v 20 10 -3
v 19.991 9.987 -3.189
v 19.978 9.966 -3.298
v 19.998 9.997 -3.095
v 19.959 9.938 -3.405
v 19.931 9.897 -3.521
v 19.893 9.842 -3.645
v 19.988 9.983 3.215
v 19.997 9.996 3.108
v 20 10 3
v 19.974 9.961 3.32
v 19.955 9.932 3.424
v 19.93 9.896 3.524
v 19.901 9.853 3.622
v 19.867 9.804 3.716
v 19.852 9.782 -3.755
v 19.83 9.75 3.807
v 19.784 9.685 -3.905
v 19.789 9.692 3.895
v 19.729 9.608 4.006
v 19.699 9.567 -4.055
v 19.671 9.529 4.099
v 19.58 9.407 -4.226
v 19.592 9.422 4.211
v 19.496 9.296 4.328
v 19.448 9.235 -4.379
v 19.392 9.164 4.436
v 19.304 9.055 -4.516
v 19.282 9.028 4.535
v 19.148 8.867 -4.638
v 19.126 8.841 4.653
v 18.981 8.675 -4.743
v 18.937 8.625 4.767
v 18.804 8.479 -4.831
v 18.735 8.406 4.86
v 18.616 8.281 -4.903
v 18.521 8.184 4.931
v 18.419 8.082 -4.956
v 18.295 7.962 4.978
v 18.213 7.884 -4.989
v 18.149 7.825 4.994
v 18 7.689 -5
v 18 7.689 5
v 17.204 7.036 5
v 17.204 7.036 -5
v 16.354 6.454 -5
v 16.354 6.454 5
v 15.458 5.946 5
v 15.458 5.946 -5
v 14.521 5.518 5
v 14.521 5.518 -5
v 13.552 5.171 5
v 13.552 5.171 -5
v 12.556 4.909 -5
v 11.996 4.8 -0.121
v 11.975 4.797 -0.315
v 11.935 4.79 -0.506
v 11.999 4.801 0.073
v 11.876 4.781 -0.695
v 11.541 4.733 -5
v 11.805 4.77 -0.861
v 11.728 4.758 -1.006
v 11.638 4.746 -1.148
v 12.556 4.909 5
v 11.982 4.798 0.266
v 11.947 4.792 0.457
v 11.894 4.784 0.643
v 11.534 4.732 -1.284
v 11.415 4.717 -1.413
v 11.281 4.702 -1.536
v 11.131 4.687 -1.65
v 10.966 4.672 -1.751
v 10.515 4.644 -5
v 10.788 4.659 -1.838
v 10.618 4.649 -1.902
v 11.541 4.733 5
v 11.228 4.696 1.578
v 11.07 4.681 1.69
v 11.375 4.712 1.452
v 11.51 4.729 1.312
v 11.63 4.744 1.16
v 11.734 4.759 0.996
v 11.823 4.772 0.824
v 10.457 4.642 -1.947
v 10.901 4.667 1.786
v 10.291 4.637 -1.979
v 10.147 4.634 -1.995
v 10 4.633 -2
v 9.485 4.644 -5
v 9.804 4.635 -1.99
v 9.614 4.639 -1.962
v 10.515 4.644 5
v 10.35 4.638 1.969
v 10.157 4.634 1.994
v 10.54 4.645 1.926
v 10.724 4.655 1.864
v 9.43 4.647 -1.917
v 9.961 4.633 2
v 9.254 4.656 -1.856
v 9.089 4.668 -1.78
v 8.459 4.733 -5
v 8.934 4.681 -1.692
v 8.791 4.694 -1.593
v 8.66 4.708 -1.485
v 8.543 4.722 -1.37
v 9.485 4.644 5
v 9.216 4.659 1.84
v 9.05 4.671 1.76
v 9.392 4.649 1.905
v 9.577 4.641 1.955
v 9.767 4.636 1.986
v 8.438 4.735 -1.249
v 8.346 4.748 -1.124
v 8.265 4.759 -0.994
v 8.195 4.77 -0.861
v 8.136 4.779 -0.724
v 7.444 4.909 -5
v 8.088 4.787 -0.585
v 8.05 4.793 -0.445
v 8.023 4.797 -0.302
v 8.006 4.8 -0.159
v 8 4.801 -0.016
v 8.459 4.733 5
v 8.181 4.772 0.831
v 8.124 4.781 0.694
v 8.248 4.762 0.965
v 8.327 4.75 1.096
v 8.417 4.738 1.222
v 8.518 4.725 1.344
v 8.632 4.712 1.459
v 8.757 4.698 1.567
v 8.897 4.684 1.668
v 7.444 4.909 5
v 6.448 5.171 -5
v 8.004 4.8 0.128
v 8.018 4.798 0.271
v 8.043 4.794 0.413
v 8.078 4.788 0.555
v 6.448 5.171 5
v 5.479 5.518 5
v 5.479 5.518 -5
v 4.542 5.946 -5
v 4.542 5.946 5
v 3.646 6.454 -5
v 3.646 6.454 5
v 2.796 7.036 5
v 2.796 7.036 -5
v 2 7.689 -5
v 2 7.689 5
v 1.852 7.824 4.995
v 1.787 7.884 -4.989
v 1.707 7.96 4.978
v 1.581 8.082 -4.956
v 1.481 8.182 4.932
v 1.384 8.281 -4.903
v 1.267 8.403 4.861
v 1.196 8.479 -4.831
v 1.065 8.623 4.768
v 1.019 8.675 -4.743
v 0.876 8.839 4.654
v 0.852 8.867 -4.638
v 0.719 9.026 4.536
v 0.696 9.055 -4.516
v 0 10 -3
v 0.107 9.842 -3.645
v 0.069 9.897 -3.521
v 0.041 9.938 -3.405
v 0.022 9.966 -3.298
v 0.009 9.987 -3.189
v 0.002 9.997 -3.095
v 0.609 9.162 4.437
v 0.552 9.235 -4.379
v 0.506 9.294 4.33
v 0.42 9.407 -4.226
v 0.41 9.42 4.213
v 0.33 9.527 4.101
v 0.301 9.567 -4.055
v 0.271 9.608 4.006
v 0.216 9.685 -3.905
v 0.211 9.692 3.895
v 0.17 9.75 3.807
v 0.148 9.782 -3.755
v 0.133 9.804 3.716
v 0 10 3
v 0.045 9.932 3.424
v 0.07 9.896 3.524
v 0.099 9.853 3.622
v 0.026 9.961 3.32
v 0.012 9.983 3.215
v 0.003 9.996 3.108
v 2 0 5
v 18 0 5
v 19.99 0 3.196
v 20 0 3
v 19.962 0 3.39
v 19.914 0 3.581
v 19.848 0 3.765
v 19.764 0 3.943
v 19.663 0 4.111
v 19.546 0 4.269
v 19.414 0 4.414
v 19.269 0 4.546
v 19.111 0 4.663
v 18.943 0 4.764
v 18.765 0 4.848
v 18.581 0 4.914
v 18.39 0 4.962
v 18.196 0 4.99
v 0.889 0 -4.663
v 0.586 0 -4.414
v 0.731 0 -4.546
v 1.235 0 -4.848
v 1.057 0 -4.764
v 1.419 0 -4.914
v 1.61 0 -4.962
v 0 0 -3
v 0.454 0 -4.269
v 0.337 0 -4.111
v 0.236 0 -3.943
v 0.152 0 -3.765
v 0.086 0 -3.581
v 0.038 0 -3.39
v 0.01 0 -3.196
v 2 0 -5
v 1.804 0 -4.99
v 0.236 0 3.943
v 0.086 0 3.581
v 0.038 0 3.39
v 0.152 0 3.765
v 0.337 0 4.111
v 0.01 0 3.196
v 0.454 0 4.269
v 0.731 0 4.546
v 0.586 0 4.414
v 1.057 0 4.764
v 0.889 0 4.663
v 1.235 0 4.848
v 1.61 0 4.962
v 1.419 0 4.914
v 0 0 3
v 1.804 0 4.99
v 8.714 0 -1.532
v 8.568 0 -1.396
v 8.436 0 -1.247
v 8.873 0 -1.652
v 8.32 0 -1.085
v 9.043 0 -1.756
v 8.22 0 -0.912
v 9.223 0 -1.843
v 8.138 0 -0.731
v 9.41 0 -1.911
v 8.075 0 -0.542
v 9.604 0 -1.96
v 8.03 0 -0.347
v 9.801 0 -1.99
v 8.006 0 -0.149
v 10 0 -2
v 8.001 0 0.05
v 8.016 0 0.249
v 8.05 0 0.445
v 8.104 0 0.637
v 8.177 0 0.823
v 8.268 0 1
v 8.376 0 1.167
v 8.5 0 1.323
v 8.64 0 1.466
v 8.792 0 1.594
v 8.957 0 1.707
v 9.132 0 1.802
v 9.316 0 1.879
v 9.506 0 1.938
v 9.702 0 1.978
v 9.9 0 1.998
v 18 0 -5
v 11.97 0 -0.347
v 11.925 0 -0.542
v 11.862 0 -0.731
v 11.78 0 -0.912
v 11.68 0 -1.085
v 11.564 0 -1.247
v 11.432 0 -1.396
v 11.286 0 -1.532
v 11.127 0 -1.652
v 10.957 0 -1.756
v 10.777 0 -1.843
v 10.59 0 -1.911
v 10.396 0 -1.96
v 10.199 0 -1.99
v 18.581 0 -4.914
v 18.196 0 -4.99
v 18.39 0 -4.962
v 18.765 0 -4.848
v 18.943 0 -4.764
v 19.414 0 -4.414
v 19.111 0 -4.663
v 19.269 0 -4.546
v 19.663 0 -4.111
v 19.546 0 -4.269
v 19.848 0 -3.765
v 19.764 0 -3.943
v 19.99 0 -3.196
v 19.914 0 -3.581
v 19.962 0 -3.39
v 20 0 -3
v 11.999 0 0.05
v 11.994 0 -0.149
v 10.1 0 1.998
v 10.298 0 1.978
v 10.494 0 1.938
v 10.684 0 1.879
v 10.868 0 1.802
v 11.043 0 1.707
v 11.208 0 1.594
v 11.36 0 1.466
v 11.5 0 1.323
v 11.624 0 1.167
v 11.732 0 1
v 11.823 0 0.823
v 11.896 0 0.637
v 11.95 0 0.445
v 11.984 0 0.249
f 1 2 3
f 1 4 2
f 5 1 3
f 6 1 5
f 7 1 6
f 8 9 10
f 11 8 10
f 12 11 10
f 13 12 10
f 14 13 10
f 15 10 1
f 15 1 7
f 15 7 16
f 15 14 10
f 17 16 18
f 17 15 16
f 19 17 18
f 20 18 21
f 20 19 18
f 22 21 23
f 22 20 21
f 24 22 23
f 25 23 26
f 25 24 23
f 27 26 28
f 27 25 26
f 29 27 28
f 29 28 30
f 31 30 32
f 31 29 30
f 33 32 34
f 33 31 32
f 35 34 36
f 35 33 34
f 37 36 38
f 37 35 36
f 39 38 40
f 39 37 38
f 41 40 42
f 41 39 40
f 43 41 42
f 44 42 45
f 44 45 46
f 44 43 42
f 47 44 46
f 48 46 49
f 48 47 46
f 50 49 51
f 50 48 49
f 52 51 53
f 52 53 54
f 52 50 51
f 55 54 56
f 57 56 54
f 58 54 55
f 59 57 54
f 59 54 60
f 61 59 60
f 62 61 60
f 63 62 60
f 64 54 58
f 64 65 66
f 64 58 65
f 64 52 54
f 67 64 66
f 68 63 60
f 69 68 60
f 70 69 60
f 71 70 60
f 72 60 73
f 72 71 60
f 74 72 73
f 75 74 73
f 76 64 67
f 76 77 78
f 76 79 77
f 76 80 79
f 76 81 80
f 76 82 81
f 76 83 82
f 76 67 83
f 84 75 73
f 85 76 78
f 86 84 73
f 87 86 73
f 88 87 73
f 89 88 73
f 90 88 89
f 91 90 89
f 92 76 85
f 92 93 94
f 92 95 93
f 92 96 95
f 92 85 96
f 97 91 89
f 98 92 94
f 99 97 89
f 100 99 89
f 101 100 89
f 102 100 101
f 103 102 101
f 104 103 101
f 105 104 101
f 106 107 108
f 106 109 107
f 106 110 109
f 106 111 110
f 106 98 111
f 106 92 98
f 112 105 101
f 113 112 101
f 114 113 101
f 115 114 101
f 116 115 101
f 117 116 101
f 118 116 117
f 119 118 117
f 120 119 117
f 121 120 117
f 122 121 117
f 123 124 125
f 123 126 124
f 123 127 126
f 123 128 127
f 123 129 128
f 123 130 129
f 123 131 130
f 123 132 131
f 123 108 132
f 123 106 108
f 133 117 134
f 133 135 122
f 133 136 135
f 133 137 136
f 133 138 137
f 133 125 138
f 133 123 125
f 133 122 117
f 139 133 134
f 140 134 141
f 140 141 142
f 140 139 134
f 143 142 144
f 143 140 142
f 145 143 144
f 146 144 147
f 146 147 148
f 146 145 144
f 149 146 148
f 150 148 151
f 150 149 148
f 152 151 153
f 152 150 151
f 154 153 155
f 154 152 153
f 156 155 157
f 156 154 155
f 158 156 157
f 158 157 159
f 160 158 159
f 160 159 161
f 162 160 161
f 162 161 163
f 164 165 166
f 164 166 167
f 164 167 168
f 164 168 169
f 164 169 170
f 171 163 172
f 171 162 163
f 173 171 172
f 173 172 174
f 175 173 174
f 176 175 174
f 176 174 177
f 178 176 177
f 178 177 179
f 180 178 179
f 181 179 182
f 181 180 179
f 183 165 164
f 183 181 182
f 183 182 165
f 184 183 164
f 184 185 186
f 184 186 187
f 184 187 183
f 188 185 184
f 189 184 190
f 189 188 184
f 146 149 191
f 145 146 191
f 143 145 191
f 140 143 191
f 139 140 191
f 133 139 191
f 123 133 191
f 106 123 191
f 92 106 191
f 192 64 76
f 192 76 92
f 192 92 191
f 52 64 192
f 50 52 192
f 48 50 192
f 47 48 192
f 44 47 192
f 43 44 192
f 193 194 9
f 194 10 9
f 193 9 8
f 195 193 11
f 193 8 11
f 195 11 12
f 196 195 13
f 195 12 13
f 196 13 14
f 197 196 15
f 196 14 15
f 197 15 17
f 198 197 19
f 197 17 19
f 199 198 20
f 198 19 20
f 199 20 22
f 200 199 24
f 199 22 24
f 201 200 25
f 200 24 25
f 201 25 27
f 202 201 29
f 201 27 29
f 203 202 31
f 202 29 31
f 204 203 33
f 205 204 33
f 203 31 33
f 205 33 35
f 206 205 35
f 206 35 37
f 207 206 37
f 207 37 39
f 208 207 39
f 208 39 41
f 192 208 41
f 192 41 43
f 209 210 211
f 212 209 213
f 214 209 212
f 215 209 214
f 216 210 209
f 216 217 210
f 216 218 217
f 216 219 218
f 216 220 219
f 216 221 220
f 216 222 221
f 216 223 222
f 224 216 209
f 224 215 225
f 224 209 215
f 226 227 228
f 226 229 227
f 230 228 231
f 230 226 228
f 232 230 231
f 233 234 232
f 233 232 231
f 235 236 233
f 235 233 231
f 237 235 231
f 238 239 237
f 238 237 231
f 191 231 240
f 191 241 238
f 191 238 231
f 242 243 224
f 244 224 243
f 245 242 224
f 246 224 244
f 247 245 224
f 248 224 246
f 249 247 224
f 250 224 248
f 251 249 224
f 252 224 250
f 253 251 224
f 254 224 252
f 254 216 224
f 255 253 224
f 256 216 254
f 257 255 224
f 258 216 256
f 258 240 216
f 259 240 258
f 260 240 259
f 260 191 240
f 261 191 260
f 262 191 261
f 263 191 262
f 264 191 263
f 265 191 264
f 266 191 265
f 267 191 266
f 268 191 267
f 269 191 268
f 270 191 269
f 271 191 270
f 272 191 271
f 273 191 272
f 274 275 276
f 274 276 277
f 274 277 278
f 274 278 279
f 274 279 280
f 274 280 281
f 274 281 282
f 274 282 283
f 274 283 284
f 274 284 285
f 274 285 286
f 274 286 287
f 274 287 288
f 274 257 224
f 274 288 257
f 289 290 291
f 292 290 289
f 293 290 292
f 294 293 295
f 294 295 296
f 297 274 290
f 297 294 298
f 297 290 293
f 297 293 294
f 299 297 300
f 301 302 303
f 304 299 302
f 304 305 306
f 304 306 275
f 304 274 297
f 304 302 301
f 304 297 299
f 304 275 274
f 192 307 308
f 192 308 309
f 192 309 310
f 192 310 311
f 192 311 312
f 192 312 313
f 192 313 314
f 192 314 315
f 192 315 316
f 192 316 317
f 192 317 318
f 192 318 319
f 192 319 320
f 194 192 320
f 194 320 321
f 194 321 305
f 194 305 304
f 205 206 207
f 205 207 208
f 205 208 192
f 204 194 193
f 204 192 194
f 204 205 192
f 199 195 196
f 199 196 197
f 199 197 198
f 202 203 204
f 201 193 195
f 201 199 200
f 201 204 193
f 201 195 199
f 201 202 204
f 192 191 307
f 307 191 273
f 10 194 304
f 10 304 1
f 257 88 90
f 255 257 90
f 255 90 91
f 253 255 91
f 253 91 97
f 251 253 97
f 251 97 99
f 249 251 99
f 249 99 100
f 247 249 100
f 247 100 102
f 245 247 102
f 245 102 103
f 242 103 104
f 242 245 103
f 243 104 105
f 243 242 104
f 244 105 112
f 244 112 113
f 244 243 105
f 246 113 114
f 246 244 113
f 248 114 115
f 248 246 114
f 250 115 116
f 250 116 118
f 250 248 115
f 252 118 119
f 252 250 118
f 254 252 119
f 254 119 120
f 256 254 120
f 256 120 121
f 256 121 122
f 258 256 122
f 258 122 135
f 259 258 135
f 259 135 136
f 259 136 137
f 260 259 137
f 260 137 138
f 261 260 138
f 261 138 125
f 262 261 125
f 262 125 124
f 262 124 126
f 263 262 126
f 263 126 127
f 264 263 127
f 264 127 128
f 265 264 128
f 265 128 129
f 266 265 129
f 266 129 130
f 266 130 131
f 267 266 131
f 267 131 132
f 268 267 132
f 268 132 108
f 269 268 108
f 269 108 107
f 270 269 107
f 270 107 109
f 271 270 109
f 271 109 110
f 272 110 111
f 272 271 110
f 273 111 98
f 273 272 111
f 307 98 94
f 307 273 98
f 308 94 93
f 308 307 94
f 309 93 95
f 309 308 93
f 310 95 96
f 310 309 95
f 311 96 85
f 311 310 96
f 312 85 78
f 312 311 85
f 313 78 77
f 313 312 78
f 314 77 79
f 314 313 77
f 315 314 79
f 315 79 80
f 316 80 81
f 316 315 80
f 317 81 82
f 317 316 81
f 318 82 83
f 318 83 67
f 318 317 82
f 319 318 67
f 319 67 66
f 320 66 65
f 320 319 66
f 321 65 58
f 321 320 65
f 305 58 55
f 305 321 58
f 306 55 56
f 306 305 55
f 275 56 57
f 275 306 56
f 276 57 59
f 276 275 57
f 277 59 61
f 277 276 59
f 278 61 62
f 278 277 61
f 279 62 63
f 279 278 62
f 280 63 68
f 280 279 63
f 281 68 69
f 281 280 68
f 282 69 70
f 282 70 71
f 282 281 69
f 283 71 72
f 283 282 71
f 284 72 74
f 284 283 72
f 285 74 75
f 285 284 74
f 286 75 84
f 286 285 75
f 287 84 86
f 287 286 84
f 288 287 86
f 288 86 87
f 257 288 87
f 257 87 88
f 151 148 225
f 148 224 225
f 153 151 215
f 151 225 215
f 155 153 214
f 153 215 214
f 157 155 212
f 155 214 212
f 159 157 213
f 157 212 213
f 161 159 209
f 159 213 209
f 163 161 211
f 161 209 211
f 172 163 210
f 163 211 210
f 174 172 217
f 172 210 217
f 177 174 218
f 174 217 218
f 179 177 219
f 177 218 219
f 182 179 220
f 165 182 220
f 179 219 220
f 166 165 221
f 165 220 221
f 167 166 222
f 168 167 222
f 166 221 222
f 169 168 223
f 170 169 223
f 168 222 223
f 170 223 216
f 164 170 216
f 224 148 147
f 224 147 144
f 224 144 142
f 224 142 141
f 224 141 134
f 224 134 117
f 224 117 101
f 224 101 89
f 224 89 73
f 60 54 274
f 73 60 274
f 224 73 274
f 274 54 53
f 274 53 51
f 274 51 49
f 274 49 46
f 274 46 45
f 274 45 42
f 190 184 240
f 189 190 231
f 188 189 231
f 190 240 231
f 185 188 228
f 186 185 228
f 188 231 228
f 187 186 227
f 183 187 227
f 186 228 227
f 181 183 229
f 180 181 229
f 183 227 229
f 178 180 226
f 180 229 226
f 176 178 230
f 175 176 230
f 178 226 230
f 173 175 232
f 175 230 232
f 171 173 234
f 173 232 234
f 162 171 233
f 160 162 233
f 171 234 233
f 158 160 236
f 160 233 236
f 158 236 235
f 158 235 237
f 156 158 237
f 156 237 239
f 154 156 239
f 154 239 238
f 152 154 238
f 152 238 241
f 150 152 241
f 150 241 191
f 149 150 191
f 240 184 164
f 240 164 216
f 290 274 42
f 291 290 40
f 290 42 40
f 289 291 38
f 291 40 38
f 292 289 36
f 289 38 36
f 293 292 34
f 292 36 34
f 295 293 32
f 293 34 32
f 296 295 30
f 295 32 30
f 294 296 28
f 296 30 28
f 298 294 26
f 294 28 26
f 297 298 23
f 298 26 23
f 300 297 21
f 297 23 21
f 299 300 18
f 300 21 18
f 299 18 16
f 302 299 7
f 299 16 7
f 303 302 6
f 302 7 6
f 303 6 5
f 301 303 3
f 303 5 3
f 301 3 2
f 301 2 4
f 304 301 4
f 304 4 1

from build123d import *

# Parameters (mm, degrees)
EXTRUDE_1_DEPTH     = 5
SKETCH_2_R          = 2
CUT_EXTRUDE_1_DEPTH = 15
FILLET_1_R          = 2


with BuildPart() as part:
    # 草图1 → 凸台-拉伸1 (new, symmetric)
    with BuildSketch(Plane.XY):
        with BuildLine():
            Line((0, 0), (20, 0))
            Line((20, 0), (20, 10))
            ThreePointArc((20, 10), (10, 4.633249581), (0, 10))
            Line((0, 10), (0, 0))
        make_face()
    extrude(amount=EXTRUDE_1_DEPTH, both=True)

    # 草图2 → 切除-拉伸1 (cut)
    with BuildSketch(Plane(origin=(0, 0, 0), x_dir=(1, 0, 0), z_dir=(0, 1, 0))):
        with Locations(Location((10, 0, 0), (0, 0, 90))):
            Circle(SKETCH_2_R)
    extrude(amount=CUT_EXTRUDE_1_DEPTH, mode=Mode.SUBTRACT)

    # 圆角1
    fillet_1_edges = [part.edges().sort_by_distance(p)[0] for p in [
        (20, 5, 5),
        (0, 5, 5),
        (20, 5, -5),
        (0, 5, -5),
    ]]
    fillet(fillet_1_edges, radius=FILLET_1_R)


solid = part.part
